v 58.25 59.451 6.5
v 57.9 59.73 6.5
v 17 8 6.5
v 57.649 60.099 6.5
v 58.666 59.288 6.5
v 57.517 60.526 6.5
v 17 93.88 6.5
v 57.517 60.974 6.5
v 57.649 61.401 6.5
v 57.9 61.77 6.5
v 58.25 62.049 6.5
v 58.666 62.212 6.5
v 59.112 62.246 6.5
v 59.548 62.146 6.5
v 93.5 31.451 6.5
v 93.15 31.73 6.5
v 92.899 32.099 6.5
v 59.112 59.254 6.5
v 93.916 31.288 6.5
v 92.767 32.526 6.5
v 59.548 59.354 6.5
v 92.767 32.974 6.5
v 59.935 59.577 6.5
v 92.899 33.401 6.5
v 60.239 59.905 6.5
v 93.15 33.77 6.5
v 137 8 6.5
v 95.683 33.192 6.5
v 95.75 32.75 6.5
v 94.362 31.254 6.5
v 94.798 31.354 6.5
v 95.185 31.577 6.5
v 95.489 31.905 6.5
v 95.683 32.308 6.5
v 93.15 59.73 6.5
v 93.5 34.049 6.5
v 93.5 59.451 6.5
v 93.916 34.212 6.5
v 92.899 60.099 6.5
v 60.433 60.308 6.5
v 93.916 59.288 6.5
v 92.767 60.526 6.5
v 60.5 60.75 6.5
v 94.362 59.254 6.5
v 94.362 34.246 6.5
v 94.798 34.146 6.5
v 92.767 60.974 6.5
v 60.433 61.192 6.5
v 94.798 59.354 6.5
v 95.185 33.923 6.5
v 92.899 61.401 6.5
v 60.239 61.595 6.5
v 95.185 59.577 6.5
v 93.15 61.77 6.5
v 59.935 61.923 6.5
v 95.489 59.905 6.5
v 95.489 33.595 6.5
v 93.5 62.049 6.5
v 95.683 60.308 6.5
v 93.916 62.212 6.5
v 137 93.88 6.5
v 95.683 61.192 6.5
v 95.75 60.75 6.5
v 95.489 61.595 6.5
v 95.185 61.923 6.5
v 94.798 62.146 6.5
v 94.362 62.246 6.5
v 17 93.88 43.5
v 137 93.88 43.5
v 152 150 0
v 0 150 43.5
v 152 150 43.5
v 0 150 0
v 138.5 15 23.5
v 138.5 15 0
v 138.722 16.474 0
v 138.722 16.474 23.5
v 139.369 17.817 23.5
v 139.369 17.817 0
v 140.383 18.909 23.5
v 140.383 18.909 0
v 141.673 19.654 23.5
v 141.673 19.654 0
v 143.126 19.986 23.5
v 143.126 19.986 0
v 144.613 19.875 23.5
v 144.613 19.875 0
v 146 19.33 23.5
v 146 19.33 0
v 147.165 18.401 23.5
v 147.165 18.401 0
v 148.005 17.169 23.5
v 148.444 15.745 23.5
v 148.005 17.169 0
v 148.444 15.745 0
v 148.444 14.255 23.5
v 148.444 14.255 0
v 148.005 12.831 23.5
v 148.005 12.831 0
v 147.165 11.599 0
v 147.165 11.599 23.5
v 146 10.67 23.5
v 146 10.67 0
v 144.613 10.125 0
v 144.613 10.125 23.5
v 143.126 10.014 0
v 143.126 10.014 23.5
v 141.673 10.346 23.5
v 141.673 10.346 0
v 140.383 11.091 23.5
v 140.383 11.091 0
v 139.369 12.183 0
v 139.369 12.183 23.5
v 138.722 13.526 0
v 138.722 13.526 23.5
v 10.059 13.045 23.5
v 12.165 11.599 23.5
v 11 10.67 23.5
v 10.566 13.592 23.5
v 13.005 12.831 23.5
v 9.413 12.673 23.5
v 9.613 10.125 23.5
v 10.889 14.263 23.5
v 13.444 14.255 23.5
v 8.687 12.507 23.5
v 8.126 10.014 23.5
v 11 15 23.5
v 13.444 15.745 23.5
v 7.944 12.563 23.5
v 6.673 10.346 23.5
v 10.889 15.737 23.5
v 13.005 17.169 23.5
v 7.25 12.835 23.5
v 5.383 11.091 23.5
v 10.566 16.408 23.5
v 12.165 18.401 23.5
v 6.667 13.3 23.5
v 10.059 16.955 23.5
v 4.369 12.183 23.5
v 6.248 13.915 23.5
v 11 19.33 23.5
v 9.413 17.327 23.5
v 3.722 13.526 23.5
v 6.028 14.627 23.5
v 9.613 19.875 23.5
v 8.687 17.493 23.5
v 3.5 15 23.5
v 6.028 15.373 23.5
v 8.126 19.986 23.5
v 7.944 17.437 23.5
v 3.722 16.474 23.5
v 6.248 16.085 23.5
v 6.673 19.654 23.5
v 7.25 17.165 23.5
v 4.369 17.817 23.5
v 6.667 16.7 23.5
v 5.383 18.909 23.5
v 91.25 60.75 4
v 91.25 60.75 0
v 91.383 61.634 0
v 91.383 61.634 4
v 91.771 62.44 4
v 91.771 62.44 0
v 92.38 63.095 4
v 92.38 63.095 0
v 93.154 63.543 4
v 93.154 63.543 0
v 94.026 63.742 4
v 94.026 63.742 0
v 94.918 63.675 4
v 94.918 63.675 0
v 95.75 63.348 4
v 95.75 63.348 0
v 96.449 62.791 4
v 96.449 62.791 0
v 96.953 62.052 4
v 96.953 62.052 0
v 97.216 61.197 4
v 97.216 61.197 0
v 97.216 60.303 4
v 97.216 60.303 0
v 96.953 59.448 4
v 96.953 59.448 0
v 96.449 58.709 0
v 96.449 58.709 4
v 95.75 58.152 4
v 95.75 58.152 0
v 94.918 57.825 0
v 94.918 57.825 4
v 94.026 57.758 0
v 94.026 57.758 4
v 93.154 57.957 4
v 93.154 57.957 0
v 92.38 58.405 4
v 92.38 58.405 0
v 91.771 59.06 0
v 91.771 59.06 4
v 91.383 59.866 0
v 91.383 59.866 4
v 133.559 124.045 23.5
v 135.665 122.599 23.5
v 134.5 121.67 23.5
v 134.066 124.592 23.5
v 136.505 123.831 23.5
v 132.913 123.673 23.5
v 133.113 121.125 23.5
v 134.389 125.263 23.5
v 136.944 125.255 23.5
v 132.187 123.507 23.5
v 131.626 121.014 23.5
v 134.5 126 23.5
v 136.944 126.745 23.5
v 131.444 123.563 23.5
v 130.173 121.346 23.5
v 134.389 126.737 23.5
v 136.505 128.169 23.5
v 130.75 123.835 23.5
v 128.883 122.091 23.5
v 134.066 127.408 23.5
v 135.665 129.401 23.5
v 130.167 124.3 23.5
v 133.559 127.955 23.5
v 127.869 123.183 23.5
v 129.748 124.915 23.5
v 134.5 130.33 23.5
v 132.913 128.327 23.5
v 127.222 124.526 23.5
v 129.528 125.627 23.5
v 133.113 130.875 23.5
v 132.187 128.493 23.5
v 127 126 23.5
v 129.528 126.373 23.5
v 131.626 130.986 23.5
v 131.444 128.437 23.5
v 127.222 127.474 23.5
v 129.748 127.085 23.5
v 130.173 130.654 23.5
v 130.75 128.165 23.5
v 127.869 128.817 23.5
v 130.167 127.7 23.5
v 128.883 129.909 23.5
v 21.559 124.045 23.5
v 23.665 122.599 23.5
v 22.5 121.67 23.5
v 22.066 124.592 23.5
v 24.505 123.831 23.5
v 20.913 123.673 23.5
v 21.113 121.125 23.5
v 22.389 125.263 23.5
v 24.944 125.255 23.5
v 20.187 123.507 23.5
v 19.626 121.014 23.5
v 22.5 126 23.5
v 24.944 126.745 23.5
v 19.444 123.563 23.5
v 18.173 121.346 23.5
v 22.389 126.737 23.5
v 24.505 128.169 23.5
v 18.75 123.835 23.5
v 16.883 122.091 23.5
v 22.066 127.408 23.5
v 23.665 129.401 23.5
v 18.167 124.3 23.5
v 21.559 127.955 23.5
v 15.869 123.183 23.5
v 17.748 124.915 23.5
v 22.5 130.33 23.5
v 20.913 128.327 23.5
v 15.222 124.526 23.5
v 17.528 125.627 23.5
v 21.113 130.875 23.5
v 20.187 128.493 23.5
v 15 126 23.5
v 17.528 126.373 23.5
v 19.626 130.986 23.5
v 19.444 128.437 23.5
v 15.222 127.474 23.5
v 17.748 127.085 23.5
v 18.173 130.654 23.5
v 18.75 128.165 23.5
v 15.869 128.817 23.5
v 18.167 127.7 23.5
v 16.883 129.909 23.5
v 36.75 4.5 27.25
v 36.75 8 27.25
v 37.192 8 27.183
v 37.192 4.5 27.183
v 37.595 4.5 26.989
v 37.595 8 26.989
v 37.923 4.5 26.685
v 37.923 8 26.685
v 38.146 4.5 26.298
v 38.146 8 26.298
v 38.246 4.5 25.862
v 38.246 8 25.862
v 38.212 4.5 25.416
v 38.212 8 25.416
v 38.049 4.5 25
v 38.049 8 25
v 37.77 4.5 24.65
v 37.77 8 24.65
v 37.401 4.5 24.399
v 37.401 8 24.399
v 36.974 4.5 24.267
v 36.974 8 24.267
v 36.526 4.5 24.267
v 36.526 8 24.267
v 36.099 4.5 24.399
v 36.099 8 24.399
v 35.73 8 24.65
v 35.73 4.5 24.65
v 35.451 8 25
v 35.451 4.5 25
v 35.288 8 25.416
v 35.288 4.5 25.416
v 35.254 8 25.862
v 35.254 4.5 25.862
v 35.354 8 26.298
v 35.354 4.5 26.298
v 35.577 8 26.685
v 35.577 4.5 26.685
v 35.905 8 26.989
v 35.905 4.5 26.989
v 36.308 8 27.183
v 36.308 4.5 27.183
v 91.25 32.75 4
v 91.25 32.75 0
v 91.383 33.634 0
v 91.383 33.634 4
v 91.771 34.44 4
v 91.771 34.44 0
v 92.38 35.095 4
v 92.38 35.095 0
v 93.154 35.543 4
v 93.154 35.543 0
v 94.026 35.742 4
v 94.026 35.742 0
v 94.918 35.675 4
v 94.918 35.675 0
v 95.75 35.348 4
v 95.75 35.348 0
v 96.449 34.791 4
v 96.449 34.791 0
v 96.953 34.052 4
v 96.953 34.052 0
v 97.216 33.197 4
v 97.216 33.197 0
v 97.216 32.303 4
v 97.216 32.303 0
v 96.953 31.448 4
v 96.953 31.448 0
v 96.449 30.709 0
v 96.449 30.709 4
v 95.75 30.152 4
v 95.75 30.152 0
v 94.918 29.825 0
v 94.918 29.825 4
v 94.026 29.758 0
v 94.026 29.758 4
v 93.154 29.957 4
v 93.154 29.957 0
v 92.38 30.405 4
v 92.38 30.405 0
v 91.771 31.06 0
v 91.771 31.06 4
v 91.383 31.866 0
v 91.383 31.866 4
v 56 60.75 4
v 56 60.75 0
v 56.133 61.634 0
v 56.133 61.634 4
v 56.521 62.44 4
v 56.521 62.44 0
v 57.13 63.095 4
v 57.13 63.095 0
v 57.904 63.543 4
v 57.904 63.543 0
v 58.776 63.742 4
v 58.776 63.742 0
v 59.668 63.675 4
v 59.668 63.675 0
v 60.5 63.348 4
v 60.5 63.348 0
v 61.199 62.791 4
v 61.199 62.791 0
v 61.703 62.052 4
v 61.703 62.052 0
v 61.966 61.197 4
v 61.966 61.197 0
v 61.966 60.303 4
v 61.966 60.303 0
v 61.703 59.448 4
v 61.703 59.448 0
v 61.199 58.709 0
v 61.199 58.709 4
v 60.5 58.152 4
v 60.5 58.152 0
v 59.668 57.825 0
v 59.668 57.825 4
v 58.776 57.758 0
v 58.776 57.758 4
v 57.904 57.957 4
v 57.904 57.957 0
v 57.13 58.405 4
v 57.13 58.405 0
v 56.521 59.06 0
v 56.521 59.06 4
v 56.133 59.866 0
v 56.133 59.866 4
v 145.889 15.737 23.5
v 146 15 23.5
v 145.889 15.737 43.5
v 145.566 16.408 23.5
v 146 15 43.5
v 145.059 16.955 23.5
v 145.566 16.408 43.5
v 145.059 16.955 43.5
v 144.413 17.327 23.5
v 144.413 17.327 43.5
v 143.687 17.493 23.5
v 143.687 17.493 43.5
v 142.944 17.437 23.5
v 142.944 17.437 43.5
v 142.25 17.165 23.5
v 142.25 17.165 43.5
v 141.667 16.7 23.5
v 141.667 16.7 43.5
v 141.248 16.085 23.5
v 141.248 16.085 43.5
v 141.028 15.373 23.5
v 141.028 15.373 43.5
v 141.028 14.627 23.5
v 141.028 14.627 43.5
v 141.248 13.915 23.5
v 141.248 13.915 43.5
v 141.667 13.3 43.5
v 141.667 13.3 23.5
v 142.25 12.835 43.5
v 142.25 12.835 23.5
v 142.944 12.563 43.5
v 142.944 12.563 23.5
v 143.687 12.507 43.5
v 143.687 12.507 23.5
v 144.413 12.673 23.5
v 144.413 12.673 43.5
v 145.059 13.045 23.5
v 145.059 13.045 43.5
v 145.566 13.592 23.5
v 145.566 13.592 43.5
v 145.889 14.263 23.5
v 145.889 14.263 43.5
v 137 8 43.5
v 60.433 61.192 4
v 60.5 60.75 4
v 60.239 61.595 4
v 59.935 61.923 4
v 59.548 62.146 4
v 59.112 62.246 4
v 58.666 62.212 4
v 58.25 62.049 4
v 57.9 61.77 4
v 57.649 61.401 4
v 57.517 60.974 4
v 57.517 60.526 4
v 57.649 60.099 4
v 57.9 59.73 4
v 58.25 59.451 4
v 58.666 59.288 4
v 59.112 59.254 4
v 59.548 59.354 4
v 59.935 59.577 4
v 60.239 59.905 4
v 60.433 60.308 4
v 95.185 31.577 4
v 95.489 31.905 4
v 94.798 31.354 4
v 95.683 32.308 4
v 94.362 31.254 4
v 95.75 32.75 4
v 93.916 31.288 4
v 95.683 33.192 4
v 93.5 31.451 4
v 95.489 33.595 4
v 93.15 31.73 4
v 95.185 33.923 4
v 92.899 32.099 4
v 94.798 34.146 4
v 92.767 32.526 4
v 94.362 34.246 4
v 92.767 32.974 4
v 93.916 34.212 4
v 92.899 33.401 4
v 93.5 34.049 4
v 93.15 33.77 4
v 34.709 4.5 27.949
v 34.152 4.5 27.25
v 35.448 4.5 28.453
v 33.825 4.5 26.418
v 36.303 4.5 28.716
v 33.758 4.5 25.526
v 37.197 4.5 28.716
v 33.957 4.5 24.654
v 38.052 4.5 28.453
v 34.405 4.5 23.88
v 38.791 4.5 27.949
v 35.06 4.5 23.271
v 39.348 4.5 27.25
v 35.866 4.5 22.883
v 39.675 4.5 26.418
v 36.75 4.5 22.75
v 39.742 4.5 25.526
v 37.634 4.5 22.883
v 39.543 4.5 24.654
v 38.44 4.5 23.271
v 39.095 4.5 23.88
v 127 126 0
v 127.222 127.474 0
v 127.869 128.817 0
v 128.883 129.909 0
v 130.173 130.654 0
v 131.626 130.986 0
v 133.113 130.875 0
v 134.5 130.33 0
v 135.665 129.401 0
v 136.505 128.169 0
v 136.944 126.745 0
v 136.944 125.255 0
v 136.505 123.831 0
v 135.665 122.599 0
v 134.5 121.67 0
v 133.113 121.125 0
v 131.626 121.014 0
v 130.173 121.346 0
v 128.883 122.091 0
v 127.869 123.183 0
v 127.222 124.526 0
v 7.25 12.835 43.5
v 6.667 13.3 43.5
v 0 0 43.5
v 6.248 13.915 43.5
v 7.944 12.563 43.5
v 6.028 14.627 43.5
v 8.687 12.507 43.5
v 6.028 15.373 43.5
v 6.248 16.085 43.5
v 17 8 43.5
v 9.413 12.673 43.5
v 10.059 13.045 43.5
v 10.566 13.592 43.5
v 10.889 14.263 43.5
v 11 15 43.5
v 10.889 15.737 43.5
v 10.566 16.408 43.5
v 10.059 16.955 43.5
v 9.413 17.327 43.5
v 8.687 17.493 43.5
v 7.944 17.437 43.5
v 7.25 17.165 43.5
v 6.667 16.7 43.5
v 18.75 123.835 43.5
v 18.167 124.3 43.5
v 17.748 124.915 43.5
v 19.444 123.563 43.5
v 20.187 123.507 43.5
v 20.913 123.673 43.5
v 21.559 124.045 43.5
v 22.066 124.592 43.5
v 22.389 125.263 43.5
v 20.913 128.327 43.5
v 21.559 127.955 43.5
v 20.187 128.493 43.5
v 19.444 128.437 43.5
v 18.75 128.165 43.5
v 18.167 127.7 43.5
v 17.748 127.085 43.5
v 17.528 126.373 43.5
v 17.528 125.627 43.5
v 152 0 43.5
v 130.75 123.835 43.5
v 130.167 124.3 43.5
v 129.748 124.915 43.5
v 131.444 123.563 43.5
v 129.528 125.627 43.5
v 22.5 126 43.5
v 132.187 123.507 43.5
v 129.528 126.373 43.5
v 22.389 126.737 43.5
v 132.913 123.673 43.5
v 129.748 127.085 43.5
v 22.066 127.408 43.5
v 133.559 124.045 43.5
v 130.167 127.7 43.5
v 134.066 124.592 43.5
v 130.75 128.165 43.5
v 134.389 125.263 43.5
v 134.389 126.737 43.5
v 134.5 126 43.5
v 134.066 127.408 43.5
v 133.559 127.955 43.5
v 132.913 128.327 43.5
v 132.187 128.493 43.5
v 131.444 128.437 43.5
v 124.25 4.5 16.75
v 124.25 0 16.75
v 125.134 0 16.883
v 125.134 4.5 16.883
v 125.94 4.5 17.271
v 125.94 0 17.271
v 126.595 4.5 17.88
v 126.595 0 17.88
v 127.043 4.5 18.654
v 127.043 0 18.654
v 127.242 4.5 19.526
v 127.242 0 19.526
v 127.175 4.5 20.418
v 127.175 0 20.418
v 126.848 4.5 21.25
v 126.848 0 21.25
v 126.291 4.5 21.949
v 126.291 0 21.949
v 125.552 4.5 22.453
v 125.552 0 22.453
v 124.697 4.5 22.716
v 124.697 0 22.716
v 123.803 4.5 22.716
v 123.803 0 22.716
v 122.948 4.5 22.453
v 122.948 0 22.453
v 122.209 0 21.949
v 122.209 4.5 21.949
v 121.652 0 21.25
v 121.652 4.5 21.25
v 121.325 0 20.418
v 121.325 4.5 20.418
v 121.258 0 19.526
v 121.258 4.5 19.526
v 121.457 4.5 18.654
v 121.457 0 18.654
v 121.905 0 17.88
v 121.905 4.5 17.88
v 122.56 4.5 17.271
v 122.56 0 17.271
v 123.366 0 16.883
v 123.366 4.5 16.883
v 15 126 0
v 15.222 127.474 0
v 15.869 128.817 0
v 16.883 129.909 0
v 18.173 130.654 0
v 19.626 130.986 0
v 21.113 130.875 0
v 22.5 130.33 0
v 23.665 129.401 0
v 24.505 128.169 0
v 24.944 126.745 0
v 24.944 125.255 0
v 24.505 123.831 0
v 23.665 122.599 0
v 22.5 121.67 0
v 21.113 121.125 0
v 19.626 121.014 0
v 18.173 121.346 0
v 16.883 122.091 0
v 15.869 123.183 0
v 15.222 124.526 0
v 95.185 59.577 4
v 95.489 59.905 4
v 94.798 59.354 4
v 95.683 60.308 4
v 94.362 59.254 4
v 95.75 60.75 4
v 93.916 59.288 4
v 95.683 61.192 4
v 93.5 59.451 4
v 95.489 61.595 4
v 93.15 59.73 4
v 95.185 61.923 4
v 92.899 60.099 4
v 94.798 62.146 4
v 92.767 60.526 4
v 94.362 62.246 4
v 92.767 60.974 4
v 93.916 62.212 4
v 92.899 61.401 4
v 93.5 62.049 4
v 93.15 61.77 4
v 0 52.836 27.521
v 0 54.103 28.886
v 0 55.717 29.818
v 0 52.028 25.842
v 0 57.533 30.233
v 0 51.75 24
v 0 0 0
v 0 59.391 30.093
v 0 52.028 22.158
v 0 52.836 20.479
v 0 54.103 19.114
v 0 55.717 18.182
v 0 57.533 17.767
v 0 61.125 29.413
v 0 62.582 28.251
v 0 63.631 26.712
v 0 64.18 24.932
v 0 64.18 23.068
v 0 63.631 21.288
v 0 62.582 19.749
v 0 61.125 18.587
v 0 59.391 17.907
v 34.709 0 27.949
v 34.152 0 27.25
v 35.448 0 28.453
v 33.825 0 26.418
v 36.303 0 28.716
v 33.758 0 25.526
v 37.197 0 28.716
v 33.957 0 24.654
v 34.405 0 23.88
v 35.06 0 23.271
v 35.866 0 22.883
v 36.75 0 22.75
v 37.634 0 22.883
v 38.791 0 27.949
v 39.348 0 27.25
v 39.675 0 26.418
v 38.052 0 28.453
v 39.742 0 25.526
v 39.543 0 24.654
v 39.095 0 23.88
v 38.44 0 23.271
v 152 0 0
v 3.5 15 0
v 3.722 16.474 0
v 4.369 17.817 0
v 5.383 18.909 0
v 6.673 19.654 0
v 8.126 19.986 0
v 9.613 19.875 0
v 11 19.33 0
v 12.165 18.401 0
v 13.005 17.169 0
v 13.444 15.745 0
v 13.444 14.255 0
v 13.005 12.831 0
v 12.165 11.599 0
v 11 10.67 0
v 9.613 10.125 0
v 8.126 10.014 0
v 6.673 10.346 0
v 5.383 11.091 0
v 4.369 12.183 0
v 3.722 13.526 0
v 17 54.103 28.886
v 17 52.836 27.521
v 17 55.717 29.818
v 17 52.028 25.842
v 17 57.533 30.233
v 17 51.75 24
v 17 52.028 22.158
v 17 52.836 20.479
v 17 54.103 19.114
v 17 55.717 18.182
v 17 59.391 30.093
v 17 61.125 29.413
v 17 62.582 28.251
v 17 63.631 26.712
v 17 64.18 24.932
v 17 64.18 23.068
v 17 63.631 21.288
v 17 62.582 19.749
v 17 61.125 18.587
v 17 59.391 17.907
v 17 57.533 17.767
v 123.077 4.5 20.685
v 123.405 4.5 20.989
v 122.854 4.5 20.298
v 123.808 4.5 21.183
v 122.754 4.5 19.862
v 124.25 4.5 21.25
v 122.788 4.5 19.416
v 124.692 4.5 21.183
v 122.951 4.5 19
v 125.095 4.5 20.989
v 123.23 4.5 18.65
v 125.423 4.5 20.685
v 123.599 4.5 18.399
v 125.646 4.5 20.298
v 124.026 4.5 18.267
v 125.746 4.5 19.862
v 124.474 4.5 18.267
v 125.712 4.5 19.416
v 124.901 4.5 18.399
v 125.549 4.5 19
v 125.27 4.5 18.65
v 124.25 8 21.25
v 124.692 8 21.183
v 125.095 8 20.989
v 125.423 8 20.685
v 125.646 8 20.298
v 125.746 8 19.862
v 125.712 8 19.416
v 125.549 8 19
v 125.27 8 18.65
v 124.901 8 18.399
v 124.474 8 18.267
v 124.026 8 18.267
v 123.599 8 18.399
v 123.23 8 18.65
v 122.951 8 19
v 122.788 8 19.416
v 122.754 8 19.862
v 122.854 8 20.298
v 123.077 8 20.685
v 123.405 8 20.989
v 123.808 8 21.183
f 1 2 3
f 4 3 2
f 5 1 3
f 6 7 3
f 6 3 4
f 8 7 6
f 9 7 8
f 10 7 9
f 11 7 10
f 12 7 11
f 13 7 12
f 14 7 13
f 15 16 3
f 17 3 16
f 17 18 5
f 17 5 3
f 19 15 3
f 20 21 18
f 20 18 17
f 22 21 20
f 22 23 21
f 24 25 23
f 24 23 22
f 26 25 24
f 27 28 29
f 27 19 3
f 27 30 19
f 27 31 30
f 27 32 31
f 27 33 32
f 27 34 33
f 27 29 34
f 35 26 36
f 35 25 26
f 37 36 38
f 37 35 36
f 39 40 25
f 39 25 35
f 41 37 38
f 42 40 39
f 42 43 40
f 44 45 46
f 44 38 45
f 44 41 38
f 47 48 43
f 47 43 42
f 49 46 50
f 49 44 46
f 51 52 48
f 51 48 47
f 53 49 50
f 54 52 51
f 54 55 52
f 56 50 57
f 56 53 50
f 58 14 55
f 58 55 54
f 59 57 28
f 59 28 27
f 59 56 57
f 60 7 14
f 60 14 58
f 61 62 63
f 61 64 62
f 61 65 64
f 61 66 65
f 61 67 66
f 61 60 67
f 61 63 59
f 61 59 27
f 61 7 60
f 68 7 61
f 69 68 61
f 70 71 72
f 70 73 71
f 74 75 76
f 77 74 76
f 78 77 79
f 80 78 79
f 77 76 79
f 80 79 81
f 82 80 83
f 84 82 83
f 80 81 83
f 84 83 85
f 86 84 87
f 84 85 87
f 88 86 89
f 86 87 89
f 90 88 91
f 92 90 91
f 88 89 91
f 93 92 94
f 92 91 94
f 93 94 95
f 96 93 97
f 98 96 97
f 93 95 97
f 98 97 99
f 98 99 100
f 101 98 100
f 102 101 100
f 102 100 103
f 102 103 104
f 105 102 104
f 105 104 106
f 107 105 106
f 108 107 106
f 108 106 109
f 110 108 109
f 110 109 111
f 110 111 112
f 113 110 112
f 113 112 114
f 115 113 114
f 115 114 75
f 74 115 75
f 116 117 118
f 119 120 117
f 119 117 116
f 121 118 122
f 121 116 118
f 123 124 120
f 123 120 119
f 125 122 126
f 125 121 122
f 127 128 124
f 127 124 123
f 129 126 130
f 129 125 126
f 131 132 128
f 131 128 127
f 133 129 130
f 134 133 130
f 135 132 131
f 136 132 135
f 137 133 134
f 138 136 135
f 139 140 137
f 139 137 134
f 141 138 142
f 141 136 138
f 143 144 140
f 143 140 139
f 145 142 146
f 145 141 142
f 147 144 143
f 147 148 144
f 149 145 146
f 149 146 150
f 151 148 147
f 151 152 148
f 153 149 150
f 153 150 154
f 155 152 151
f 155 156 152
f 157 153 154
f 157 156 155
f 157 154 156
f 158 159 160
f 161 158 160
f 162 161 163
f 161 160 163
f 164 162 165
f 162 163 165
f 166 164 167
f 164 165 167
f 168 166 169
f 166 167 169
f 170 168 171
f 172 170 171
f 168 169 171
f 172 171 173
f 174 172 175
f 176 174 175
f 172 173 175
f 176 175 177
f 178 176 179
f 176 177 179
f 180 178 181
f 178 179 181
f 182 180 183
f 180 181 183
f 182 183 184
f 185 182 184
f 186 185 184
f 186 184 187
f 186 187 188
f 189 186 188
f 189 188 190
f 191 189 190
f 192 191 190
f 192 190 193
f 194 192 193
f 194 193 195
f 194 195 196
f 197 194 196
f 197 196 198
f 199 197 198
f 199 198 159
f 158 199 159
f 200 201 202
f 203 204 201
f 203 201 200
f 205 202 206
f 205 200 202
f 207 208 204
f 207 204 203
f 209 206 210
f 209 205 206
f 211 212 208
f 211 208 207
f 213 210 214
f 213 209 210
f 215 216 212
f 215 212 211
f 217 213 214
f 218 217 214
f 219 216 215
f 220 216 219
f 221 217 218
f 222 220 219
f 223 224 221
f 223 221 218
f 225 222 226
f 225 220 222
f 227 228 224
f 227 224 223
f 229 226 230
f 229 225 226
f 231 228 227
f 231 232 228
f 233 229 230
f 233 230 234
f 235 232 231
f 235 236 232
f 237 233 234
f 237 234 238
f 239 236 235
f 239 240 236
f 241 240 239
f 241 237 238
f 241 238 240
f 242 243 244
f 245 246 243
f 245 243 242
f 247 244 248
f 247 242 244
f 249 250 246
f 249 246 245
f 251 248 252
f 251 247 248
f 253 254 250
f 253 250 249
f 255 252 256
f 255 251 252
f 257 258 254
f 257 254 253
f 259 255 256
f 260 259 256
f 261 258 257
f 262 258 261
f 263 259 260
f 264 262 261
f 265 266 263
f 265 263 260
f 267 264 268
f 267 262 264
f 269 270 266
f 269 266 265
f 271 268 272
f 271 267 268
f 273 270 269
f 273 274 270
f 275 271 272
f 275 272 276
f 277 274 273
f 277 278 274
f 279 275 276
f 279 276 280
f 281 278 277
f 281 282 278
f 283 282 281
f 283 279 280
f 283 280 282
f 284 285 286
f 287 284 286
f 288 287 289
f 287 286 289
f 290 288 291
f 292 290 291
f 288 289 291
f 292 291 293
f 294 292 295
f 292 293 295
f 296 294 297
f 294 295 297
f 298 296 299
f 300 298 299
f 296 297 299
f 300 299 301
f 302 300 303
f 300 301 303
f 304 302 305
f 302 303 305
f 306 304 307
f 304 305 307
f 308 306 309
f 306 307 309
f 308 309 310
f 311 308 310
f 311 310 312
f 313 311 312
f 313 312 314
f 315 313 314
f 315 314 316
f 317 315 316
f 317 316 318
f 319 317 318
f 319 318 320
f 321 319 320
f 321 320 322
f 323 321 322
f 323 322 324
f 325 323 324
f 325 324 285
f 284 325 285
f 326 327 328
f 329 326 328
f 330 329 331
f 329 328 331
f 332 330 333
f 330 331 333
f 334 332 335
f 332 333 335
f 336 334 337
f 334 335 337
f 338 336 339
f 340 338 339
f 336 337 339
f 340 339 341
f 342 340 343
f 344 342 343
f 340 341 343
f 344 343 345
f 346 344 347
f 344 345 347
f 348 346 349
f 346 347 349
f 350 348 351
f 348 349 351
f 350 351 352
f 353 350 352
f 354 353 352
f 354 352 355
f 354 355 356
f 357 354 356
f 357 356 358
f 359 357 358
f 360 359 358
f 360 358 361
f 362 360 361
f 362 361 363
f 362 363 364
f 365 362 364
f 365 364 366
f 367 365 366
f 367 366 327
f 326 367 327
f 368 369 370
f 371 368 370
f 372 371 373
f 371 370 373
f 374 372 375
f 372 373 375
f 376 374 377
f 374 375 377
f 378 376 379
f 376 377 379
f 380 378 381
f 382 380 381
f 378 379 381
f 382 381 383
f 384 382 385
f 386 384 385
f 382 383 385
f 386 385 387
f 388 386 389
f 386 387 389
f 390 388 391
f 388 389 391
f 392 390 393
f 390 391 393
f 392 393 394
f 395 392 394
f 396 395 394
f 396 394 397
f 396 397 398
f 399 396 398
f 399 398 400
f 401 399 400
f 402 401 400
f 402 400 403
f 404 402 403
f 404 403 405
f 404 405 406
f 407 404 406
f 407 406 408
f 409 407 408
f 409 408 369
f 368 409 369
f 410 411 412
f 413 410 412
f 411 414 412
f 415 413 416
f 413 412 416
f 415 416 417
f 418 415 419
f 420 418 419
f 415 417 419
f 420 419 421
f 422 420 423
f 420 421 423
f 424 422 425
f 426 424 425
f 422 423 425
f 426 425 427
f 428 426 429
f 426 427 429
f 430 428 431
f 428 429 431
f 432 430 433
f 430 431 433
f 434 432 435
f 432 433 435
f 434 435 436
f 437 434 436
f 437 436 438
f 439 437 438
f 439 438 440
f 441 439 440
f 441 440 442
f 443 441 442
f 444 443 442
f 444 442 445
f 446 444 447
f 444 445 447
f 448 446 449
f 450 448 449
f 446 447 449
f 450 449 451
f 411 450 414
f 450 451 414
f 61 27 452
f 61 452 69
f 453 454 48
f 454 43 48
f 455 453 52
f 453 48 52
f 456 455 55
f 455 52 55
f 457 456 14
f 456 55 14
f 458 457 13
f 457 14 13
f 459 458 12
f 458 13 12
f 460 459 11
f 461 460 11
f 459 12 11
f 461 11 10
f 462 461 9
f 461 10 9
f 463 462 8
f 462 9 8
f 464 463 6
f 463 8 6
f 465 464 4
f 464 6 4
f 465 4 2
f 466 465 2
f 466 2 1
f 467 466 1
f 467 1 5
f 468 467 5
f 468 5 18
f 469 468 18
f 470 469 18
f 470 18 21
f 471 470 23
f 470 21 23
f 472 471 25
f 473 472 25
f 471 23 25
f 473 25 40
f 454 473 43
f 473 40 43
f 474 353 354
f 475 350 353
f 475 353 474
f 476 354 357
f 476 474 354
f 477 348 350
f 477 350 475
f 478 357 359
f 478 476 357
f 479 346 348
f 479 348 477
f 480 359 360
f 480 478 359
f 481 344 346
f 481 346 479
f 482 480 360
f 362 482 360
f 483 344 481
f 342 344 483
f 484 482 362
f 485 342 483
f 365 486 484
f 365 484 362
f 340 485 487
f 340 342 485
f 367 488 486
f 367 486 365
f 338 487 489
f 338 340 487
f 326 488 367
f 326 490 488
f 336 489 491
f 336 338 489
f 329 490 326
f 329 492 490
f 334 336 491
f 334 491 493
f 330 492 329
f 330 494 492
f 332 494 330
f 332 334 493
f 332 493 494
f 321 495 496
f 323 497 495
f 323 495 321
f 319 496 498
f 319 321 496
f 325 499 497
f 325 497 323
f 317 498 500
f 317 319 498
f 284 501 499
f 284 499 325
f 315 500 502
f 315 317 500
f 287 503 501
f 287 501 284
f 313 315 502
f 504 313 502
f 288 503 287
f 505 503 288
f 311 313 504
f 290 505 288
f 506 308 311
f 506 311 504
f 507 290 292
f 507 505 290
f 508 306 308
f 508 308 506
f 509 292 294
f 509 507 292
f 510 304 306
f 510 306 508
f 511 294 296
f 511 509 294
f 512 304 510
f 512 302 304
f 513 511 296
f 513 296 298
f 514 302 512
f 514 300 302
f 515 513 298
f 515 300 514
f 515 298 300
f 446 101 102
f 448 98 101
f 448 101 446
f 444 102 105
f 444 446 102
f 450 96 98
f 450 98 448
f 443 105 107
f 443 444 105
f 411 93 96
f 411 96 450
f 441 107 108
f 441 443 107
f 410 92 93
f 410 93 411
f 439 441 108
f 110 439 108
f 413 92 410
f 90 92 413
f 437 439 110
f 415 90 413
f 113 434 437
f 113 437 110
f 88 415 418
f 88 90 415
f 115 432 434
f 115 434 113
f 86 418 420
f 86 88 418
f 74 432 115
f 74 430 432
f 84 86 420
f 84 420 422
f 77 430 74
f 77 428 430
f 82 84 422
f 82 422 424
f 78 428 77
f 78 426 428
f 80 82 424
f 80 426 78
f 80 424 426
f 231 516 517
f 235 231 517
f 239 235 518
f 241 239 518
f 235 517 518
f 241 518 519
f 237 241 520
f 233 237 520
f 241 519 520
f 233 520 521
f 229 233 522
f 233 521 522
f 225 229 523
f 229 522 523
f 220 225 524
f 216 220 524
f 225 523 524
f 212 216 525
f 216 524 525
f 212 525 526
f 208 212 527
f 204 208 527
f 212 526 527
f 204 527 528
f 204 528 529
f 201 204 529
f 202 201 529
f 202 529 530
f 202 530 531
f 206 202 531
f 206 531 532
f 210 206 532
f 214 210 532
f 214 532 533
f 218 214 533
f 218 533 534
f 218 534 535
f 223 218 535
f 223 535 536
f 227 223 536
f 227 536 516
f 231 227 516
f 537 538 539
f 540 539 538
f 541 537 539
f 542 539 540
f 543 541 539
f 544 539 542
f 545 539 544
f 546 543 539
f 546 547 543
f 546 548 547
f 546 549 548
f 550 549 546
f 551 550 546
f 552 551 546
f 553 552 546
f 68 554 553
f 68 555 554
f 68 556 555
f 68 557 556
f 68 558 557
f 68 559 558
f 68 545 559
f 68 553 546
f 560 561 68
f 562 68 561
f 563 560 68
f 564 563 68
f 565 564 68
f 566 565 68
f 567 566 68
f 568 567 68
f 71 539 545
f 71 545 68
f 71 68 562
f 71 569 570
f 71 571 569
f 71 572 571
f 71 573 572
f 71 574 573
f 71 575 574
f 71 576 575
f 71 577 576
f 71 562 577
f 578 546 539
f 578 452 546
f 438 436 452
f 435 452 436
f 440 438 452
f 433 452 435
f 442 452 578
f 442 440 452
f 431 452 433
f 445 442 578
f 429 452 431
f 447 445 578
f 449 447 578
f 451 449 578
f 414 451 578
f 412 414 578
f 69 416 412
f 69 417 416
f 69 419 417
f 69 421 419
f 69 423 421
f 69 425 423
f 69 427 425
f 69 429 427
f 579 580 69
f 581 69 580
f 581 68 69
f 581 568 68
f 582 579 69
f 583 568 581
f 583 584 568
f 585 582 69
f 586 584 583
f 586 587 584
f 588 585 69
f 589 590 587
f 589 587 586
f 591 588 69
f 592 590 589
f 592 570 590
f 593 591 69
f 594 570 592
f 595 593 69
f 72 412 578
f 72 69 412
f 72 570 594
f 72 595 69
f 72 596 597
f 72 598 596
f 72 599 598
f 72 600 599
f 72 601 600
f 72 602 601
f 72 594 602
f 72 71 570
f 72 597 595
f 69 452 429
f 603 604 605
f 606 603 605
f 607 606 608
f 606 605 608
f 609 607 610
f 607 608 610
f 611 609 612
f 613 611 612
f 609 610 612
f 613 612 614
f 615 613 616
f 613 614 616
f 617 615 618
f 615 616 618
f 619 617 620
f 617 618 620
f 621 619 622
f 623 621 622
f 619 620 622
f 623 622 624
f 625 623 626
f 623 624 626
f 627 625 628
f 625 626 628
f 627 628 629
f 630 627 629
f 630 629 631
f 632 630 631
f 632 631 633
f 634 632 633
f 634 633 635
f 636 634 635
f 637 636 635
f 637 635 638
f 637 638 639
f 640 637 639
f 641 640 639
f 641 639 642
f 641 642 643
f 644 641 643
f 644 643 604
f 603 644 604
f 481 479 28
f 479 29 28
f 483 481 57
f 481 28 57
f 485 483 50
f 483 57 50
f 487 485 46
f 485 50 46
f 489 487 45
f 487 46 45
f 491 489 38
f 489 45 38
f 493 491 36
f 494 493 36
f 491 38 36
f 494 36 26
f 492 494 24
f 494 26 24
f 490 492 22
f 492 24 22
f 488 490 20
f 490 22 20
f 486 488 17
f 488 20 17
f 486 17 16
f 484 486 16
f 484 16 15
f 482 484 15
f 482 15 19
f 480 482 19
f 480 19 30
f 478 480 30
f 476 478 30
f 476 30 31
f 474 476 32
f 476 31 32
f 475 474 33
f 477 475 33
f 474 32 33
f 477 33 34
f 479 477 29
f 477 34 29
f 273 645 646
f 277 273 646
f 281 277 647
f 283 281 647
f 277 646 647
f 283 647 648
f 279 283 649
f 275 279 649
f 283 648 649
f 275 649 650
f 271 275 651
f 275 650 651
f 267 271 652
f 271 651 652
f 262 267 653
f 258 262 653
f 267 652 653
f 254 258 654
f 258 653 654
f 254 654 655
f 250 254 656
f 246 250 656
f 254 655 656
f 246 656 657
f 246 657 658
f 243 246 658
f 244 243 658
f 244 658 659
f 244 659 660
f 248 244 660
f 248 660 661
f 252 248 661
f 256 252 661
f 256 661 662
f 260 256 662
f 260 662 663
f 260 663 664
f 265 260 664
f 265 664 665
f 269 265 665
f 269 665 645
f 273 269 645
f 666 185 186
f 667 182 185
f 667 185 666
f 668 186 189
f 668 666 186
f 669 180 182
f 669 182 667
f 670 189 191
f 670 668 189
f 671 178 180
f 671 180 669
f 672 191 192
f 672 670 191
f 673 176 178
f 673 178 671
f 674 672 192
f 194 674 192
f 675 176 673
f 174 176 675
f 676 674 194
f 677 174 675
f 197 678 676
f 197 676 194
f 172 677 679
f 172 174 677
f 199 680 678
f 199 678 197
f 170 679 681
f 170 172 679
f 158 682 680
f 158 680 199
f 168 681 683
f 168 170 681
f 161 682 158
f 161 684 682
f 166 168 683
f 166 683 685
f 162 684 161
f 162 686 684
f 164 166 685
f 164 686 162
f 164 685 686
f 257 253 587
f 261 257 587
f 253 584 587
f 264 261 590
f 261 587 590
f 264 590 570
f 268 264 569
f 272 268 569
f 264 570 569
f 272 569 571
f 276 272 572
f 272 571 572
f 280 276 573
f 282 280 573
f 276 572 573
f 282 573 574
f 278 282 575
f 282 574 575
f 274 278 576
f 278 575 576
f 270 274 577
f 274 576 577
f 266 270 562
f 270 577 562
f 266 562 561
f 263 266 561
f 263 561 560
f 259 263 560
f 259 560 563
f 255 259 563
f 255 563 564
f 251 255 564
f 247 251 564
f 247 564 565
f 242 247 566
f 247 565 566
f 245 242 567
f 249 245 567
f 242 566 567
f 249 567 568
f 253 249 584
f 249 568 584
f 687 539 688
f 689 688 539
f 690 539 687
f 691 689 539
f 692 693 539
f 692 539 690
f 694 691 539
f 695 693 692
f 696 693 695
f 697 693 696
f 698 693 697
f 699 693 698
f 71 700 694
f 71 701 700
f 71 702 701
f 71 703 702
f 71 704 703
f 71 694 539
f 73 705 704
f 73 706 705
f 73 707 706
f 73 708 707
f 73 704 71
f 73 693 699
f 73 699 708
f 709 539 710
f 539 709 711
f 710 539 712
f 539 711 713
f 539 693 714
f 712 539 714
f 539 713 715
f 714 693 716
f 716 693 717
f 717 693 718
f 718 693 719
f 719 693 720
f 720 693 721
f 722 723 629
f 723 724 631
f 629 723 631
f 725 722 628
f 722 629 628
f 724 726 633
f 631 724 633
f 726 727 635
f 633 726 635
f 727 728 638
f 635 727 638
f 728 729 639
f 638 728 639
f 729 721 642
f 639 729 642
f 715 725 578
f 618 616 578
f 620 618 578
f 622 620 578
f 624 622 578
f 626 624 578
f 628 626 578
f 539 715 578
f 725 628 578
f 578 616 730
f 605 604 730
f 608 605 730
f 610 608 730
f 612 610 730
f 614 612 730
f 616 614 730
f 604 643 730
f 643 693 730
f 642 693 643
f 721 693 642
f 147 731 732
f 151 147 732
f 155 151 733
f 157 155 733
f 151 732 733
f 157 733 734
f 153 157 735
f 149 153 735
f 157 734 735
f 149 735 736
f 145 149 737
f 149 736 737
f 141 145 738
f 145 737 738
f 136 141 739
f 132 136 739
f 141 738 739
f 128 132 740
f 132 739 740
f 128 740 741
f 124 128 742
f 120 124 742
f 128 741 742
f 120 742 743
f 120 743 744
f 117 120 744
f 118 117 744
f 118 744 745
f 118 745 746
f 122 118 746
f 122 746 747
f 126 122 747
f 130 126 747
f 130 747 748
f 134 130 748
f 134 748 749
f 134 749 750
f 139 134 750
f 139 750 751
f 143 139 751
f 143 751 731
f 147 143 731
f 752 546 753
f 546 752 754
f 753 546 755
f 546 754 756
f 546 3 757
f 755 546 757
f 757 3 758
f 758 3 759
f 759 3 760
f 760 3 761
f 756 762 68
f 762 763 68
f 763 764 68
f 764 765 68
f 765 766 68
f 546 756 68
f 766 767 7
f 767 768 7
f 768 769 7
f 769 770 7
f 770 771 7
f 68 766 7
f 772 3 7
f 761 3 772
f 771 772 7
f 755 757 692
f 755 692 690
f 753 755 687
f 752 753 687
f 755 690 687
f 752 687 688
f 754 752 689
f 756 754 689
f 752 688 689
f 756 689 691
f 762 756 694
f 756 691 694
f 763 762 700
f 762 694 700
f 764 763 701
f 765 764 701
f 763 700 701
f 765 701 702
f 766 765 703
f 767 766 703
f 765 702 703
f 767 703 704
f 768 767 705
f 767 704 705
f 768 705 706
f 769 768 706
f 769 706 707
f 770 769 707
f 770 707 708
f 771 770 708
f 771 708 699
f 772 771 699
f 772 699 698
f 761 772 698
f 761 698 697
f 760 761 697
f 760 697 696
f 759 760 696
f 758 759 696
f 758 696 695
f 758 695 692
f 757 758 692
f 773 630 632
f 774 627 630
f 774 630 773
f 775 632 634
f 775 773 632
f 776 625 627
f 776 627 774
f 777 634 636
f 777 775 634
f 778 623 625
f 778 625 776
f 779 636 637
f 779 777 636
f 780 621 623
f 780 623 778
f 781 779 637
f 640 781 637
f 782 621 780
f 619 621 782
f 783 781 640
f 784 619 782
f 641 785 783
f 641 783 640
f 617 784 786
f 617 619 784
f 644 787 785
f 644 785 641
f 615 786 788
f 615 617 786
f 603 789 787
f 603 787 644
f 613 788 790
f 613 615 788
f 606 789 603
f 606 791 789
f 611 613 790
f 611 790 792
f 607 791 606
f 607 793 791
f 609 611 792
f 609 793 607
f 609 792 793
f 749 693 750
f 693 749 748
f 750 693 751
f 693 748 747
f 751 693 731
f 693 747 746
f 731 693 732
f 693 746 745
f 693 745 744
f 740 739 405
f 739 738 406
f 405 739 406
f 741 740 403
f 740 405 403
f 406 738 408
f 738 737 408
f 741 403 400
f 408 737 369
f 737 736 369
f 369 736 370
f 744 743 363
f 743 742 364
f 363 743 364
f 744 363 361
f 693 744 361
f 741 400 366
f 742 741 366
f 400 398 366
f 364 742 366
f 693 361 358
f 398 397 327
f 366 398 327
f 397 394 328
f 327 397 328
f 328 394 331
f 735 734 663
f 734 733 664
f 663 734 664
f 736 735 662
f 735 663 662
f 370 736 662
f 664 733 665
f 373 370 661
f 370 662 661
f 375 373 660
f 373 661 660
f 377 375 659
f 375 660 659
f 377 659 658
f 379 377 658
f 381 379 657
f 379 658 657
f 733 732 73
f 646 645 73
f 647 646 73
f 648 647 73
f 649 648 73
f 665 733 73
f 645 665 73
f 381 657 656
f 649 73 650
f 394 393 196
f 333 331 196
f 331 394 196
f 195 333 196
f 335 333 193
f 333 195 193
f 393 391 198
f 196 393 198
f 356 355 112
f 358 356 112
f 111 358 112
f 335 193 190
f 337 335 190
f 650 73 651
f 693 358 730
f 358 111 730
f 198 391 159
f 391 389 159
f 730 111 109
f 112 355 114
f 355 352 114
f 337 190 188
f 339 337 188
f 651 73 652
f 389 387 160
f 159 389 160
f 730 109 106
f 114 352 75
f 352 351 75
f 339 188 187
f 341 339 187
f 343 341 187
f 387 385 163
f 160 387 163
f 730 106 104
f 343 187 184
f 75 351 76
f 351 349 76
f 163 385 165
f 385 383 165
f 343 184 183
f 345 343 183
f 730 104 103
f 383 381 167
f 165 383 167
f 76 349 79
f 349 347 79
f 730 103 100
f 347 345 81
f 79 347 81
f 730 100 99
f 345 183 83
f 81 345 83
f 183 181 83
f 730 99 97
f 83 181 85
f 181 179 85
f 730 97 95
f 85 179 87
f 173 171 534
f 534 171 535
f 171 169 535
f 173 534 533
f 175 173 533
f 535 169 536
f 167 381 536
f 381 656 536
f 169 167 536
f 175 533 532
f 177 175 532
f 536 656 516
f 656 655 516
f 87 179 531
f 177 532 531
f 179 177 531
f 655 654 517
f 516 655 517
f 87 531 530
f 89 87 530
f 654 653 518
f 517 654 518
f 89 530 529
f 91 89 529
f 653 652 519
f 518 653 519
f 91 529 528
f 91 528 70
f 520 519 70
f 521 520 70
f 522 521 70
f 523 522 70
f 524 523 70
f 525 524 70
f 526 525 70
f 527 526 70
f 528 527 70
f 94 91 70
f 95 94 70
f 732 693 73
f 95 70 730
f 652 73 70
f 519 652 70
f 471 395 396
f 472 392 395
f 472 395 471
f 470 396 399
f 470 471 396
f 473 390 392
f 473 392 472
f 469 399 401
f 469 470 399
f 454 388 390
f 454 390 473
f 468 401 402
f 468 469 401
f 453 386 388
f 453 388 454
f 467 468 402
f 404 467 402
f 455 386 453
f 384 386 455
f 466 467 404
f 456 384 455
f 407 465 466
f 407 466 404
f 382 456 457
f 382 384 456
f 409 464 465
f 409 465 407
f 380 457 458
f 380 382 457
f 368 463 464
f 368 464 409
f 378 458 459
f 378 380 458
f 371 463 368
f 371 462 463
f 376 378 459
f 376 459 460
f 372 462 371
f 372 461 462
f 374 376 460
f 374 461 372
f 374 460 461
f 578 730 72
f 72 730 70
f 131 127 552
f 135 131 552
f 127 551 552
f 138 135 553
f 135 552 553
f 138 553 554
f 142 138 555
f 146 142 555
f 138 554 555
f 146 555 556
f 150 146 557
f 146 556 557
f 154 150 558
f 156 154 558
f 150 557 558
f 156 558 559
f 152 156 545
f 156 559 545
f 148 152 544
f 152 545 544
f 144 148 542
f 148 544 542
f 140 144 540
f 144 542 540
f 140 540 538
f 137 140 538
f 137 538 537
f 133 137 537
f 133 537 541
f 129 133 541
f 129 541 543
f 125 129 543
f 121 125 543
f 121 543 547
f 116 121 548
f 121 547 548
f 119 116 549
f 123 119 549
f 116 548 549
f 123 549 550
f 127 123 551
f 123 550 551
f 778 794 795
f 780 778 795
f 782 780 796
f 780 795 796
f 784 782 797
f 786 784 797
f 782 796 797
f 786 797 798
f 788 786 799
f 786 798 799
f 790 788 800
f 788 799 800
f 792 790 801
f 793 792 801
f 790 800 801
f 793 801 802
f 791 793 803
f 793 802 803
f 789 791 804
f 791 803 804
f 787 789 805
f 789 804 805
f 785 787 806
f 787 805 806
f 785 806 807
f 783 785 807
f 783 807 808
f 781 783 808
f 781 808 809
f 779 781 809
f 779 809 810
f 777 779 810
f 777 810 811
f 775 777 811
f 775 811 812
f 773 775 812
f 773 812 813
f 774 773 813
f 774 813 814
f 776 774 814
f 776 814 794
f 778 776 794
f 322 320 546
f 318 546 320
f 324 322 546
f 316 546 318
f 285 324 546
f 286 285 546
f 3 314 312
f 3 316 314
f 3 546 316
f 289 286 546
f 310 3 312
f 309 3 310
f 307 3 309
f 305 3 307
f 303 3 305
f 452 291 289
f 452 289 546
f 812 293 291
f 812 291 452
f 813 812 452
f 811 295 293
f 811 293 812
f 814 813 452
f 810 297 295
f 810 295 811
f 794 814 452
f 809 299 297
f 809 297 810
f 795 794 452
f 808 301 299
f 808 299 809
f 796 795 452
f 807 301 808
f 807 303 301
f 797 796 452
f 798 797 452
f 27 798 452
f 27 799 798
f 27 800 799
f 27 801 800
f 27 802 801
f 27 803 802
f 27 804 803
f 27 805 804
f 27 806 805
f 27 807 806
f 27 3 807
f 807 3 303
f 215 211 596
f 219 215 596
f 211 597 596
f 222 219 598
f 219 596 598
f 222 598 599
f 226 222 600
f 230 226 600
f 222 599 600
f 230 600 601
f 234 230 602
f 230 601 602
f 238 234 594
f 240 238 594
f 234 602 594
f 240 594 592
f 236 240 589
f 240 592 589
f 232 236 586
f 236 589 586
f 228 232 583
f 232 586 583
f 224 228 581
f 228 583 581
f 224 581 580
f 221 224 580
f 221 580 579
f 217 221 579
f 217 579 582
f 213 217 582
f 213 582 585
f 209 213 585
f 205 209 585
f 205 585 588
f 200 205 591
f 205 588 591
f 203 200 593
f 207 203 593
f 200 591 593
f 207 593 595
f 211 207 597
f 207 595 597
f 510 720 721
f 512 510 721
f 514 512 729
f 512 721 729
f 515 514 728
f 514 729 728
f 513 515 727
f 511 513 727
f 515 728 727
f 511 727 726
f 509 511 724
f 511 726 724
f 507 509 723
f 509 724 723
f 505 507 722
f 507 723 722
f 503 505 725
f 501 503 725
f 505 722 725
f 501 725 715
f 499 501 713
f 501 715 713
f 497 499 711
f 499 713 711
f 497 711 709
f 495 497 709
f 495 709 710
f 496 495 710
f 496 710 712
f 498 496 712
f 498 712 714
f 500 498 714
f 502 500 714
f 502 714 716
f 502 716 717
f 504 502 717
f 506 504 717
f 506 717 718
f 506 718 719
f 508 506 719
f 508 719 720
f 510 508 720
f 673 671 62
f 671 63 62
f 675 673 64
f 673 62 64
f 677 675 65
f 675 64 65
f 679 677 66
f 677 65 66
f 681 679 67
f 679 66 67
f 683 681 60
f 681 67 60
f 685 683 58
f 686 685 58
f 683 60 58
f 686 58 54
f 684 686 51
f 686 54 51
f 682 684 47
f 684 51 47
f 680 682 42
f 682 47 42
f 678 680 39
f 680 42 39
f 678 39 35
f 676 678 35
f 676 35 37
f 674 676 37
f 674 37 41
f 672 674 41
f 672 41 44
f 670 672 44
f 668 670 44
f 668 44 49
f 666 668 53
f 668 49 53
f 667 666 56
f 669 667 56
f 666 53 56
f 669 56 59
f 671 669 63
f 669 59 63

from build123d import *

# Parameters (mm, degrees)
SKETCH1_W           = 152
SKETCH1_H           = 150
BOSS_EXTRUDE1_DEPTH = 6.5
SKETCH2_W           = 152
SKETCH2_H           = 8
BOSS_EXTRUDE2_DEPTH = 37
SKETCH3_W           = 17
SKETCH3_H           = 142
BOSS_EXTRUDE3_DEPTH = 37
SKETCH4_W           = 15
SKETCH4_H           = 142
BOSS_EXTRUDE4_DEPTH = 37
SKETCH5_W           = 120
SKETCH5_H           = 56.12
BOSS_EXTRUDE5_DEPTH = 37
HOLE2_D             = 3
HOLE2_DEPTH         = 8
HOLE2_CBORE_D       = 6
HOLE2_CBORE_DEPTH   = 4.5
HOLE3_D             = 3
HOLE3_DEPTH         = 8
HOLE3_CBORE_D       = 6
HOLE3_CBORE_DEPTH   = 4.5
HOLE4_D             = 12.5
HOLE4_DEPTH         = 17
HOLE5_D             = 3
HOLE5_CBORE_D       = 6
HOLE5_CBORE_DEPTH   = 4
HOLE6_D             = 3
HOLE6_CBORE_D       = 6
HOLE6_CBORE_DEPTH   = 4
HOLE7_D             = 3
HOLE7_CBORE_D       = 6
HOLE7_CBORE_DEPTH   = 4
HOLE9_D             = 5
HOLE9_CBORE_D       = 10
HOLE9_CBORE_DEPTH   = 23.5
HOLE10_D            = 5
HOLE10_CBORE_D      = 10
HOLE10_CBORE_DEPTH  = 23.5


with BuildPart() as part:
    # Sketch1 → Boss-Extrude1 (new body)
    with BuildSketch(Plane.XY):
        with Locations((76, 75)):
            Rectangle(SKETCH1_W, SKETCH1_H)
    extrude(amount=BOSS_EXTRUDE1_DEPTH)

    # Sketch2 → Boss-Extrude2 (add)
    with BuildSketch(Plane.XY.offset(6.5)):
        with Locations((76, 4)):
            Rectangle(SKETCH2_W, SKETCH2_H)
    extrude(amount=BOSS_EXTRUDE2_DEPTH)

    # Sketch3 → Boss-Extrude3 (add)
    with BuildSketch(Plane.XY.offset(6.5)):
        with Locations((8.5, 79)):
            Rectangle(SKETCH3_W, SKETCH3_H)
    extrude(amount=BOSS_EXTRUDE3_DEPTH)

    # Sketch4 → Boss-Extrude4 (add)
    with BuildSketch(Plane.XY.offset(6.5)):
        with Locations((144.5, 79)):
            Rectangle(SKETCH4_W, SKETCH4_H)
    extrude(amount=BOSS_EXTRUDE4_DEPTH)

    # Sketch5 → Boss-Extrude5 (add)
    with BuildSketch(Plane.XY.offset(6.5)):
        with Locations((77, 121.94)):
            Rectangle(SKETCH5_W, SKETCH5_H)
    extrude(amount=BOSS_EXTRUDE5_DEPTH)

    # Hole2
    with Locations(Plane(origin=(36.75, 0, 25.75), x_dir=(0, 0, -1), z_dir=(0, -1, 0))):
        with Locations((0, 0)):
            CounterBoreHole(HOLE2_D / 2, HOLE2_CBORE_D / 2, HOLE2_CBORE_DEPTH, depth=HOLE2_DEPTH)

    # Hole3
    with Locations(Plane(origin=(124.25, 0, 19.75), x_dir=(0, 0, -1), z_dir=(0, -1, 0))):
        with Locations((0, 0)):
            CounterBoreHole(HOLE3_D / 2, HOLE3_CBORE_D / 2, HOLE3_CBORE_DEPTH, depth=HOLE3_DEPTH)

    # Hole4
    with Locations(Plane(origin=(17, 58, 24), x_dir=(0, 1, 0), z_dir=(1, 0, 0))):
        with Locations((0, 0)):
            Hole(HOLE4_D / 2, depth=HOLE4_DEPTH)

    # Hole5 (through all)
    with Locations(Plane(origin=(94.25, 32.75, 0), x_dir=(-1, 0, 0), z_dir=(0, 0, -1))):
        with Locations((0, 0)):
            CounterBoreHole(HOLE5_D / 2, HOLE5_CBORE_D / 2, HOLE5_CBORE_DEPTH)

    # Hole6 (through all)
    with Locations(Plane(origin=(94.25, 60.75, 0), x_dir=(-1, 0, 0), z_dir=(0, 0, -1))):
        with Locations((0, 0)):
            CounterBoreHole(HOLE6_D / 2, HOLE6_CBORE_D / 2, HOLE6_CBORE_DEPTH)

    # Hole7 (through all)
    with Locations(Plane(origin=(59, 60.75, 0), x_dir=(-1, 0, 0), z_dir=(0, 0, -1))):
        with Locations((0, 0)):
            CounterBoreHole(HOLE7_D / 2, HOLE7_CBORE_D / 2, HOLE7_CBORE_DEPTH)

    # Hole9 (through all)
    with Locations(Plane(origin=(132, 126, 0), x_dir=(-1, 0, 0), z_dir=(0, 0, -1))):
        with Locations((0, 0), (112, 0)):
            CounterBoreHole(HOLE9_D / 2, HOLE9_CBORE_D / 2, HOLE9_CBORE_DEPTH)

    # Hole10 (through all)
    with Locations(Plane(origin=(143.5, 15, 0), x_dir=(-1, 0, 0), z_dir=(0, 0, -1))):
        with Locations((0, 0), (135, 0)):
            CounterBoreHole(HOLE10_D / 2, HOLE10_CBORE_D / 2, HOLE10_CBORE_DEPTH)


solid = part.part
